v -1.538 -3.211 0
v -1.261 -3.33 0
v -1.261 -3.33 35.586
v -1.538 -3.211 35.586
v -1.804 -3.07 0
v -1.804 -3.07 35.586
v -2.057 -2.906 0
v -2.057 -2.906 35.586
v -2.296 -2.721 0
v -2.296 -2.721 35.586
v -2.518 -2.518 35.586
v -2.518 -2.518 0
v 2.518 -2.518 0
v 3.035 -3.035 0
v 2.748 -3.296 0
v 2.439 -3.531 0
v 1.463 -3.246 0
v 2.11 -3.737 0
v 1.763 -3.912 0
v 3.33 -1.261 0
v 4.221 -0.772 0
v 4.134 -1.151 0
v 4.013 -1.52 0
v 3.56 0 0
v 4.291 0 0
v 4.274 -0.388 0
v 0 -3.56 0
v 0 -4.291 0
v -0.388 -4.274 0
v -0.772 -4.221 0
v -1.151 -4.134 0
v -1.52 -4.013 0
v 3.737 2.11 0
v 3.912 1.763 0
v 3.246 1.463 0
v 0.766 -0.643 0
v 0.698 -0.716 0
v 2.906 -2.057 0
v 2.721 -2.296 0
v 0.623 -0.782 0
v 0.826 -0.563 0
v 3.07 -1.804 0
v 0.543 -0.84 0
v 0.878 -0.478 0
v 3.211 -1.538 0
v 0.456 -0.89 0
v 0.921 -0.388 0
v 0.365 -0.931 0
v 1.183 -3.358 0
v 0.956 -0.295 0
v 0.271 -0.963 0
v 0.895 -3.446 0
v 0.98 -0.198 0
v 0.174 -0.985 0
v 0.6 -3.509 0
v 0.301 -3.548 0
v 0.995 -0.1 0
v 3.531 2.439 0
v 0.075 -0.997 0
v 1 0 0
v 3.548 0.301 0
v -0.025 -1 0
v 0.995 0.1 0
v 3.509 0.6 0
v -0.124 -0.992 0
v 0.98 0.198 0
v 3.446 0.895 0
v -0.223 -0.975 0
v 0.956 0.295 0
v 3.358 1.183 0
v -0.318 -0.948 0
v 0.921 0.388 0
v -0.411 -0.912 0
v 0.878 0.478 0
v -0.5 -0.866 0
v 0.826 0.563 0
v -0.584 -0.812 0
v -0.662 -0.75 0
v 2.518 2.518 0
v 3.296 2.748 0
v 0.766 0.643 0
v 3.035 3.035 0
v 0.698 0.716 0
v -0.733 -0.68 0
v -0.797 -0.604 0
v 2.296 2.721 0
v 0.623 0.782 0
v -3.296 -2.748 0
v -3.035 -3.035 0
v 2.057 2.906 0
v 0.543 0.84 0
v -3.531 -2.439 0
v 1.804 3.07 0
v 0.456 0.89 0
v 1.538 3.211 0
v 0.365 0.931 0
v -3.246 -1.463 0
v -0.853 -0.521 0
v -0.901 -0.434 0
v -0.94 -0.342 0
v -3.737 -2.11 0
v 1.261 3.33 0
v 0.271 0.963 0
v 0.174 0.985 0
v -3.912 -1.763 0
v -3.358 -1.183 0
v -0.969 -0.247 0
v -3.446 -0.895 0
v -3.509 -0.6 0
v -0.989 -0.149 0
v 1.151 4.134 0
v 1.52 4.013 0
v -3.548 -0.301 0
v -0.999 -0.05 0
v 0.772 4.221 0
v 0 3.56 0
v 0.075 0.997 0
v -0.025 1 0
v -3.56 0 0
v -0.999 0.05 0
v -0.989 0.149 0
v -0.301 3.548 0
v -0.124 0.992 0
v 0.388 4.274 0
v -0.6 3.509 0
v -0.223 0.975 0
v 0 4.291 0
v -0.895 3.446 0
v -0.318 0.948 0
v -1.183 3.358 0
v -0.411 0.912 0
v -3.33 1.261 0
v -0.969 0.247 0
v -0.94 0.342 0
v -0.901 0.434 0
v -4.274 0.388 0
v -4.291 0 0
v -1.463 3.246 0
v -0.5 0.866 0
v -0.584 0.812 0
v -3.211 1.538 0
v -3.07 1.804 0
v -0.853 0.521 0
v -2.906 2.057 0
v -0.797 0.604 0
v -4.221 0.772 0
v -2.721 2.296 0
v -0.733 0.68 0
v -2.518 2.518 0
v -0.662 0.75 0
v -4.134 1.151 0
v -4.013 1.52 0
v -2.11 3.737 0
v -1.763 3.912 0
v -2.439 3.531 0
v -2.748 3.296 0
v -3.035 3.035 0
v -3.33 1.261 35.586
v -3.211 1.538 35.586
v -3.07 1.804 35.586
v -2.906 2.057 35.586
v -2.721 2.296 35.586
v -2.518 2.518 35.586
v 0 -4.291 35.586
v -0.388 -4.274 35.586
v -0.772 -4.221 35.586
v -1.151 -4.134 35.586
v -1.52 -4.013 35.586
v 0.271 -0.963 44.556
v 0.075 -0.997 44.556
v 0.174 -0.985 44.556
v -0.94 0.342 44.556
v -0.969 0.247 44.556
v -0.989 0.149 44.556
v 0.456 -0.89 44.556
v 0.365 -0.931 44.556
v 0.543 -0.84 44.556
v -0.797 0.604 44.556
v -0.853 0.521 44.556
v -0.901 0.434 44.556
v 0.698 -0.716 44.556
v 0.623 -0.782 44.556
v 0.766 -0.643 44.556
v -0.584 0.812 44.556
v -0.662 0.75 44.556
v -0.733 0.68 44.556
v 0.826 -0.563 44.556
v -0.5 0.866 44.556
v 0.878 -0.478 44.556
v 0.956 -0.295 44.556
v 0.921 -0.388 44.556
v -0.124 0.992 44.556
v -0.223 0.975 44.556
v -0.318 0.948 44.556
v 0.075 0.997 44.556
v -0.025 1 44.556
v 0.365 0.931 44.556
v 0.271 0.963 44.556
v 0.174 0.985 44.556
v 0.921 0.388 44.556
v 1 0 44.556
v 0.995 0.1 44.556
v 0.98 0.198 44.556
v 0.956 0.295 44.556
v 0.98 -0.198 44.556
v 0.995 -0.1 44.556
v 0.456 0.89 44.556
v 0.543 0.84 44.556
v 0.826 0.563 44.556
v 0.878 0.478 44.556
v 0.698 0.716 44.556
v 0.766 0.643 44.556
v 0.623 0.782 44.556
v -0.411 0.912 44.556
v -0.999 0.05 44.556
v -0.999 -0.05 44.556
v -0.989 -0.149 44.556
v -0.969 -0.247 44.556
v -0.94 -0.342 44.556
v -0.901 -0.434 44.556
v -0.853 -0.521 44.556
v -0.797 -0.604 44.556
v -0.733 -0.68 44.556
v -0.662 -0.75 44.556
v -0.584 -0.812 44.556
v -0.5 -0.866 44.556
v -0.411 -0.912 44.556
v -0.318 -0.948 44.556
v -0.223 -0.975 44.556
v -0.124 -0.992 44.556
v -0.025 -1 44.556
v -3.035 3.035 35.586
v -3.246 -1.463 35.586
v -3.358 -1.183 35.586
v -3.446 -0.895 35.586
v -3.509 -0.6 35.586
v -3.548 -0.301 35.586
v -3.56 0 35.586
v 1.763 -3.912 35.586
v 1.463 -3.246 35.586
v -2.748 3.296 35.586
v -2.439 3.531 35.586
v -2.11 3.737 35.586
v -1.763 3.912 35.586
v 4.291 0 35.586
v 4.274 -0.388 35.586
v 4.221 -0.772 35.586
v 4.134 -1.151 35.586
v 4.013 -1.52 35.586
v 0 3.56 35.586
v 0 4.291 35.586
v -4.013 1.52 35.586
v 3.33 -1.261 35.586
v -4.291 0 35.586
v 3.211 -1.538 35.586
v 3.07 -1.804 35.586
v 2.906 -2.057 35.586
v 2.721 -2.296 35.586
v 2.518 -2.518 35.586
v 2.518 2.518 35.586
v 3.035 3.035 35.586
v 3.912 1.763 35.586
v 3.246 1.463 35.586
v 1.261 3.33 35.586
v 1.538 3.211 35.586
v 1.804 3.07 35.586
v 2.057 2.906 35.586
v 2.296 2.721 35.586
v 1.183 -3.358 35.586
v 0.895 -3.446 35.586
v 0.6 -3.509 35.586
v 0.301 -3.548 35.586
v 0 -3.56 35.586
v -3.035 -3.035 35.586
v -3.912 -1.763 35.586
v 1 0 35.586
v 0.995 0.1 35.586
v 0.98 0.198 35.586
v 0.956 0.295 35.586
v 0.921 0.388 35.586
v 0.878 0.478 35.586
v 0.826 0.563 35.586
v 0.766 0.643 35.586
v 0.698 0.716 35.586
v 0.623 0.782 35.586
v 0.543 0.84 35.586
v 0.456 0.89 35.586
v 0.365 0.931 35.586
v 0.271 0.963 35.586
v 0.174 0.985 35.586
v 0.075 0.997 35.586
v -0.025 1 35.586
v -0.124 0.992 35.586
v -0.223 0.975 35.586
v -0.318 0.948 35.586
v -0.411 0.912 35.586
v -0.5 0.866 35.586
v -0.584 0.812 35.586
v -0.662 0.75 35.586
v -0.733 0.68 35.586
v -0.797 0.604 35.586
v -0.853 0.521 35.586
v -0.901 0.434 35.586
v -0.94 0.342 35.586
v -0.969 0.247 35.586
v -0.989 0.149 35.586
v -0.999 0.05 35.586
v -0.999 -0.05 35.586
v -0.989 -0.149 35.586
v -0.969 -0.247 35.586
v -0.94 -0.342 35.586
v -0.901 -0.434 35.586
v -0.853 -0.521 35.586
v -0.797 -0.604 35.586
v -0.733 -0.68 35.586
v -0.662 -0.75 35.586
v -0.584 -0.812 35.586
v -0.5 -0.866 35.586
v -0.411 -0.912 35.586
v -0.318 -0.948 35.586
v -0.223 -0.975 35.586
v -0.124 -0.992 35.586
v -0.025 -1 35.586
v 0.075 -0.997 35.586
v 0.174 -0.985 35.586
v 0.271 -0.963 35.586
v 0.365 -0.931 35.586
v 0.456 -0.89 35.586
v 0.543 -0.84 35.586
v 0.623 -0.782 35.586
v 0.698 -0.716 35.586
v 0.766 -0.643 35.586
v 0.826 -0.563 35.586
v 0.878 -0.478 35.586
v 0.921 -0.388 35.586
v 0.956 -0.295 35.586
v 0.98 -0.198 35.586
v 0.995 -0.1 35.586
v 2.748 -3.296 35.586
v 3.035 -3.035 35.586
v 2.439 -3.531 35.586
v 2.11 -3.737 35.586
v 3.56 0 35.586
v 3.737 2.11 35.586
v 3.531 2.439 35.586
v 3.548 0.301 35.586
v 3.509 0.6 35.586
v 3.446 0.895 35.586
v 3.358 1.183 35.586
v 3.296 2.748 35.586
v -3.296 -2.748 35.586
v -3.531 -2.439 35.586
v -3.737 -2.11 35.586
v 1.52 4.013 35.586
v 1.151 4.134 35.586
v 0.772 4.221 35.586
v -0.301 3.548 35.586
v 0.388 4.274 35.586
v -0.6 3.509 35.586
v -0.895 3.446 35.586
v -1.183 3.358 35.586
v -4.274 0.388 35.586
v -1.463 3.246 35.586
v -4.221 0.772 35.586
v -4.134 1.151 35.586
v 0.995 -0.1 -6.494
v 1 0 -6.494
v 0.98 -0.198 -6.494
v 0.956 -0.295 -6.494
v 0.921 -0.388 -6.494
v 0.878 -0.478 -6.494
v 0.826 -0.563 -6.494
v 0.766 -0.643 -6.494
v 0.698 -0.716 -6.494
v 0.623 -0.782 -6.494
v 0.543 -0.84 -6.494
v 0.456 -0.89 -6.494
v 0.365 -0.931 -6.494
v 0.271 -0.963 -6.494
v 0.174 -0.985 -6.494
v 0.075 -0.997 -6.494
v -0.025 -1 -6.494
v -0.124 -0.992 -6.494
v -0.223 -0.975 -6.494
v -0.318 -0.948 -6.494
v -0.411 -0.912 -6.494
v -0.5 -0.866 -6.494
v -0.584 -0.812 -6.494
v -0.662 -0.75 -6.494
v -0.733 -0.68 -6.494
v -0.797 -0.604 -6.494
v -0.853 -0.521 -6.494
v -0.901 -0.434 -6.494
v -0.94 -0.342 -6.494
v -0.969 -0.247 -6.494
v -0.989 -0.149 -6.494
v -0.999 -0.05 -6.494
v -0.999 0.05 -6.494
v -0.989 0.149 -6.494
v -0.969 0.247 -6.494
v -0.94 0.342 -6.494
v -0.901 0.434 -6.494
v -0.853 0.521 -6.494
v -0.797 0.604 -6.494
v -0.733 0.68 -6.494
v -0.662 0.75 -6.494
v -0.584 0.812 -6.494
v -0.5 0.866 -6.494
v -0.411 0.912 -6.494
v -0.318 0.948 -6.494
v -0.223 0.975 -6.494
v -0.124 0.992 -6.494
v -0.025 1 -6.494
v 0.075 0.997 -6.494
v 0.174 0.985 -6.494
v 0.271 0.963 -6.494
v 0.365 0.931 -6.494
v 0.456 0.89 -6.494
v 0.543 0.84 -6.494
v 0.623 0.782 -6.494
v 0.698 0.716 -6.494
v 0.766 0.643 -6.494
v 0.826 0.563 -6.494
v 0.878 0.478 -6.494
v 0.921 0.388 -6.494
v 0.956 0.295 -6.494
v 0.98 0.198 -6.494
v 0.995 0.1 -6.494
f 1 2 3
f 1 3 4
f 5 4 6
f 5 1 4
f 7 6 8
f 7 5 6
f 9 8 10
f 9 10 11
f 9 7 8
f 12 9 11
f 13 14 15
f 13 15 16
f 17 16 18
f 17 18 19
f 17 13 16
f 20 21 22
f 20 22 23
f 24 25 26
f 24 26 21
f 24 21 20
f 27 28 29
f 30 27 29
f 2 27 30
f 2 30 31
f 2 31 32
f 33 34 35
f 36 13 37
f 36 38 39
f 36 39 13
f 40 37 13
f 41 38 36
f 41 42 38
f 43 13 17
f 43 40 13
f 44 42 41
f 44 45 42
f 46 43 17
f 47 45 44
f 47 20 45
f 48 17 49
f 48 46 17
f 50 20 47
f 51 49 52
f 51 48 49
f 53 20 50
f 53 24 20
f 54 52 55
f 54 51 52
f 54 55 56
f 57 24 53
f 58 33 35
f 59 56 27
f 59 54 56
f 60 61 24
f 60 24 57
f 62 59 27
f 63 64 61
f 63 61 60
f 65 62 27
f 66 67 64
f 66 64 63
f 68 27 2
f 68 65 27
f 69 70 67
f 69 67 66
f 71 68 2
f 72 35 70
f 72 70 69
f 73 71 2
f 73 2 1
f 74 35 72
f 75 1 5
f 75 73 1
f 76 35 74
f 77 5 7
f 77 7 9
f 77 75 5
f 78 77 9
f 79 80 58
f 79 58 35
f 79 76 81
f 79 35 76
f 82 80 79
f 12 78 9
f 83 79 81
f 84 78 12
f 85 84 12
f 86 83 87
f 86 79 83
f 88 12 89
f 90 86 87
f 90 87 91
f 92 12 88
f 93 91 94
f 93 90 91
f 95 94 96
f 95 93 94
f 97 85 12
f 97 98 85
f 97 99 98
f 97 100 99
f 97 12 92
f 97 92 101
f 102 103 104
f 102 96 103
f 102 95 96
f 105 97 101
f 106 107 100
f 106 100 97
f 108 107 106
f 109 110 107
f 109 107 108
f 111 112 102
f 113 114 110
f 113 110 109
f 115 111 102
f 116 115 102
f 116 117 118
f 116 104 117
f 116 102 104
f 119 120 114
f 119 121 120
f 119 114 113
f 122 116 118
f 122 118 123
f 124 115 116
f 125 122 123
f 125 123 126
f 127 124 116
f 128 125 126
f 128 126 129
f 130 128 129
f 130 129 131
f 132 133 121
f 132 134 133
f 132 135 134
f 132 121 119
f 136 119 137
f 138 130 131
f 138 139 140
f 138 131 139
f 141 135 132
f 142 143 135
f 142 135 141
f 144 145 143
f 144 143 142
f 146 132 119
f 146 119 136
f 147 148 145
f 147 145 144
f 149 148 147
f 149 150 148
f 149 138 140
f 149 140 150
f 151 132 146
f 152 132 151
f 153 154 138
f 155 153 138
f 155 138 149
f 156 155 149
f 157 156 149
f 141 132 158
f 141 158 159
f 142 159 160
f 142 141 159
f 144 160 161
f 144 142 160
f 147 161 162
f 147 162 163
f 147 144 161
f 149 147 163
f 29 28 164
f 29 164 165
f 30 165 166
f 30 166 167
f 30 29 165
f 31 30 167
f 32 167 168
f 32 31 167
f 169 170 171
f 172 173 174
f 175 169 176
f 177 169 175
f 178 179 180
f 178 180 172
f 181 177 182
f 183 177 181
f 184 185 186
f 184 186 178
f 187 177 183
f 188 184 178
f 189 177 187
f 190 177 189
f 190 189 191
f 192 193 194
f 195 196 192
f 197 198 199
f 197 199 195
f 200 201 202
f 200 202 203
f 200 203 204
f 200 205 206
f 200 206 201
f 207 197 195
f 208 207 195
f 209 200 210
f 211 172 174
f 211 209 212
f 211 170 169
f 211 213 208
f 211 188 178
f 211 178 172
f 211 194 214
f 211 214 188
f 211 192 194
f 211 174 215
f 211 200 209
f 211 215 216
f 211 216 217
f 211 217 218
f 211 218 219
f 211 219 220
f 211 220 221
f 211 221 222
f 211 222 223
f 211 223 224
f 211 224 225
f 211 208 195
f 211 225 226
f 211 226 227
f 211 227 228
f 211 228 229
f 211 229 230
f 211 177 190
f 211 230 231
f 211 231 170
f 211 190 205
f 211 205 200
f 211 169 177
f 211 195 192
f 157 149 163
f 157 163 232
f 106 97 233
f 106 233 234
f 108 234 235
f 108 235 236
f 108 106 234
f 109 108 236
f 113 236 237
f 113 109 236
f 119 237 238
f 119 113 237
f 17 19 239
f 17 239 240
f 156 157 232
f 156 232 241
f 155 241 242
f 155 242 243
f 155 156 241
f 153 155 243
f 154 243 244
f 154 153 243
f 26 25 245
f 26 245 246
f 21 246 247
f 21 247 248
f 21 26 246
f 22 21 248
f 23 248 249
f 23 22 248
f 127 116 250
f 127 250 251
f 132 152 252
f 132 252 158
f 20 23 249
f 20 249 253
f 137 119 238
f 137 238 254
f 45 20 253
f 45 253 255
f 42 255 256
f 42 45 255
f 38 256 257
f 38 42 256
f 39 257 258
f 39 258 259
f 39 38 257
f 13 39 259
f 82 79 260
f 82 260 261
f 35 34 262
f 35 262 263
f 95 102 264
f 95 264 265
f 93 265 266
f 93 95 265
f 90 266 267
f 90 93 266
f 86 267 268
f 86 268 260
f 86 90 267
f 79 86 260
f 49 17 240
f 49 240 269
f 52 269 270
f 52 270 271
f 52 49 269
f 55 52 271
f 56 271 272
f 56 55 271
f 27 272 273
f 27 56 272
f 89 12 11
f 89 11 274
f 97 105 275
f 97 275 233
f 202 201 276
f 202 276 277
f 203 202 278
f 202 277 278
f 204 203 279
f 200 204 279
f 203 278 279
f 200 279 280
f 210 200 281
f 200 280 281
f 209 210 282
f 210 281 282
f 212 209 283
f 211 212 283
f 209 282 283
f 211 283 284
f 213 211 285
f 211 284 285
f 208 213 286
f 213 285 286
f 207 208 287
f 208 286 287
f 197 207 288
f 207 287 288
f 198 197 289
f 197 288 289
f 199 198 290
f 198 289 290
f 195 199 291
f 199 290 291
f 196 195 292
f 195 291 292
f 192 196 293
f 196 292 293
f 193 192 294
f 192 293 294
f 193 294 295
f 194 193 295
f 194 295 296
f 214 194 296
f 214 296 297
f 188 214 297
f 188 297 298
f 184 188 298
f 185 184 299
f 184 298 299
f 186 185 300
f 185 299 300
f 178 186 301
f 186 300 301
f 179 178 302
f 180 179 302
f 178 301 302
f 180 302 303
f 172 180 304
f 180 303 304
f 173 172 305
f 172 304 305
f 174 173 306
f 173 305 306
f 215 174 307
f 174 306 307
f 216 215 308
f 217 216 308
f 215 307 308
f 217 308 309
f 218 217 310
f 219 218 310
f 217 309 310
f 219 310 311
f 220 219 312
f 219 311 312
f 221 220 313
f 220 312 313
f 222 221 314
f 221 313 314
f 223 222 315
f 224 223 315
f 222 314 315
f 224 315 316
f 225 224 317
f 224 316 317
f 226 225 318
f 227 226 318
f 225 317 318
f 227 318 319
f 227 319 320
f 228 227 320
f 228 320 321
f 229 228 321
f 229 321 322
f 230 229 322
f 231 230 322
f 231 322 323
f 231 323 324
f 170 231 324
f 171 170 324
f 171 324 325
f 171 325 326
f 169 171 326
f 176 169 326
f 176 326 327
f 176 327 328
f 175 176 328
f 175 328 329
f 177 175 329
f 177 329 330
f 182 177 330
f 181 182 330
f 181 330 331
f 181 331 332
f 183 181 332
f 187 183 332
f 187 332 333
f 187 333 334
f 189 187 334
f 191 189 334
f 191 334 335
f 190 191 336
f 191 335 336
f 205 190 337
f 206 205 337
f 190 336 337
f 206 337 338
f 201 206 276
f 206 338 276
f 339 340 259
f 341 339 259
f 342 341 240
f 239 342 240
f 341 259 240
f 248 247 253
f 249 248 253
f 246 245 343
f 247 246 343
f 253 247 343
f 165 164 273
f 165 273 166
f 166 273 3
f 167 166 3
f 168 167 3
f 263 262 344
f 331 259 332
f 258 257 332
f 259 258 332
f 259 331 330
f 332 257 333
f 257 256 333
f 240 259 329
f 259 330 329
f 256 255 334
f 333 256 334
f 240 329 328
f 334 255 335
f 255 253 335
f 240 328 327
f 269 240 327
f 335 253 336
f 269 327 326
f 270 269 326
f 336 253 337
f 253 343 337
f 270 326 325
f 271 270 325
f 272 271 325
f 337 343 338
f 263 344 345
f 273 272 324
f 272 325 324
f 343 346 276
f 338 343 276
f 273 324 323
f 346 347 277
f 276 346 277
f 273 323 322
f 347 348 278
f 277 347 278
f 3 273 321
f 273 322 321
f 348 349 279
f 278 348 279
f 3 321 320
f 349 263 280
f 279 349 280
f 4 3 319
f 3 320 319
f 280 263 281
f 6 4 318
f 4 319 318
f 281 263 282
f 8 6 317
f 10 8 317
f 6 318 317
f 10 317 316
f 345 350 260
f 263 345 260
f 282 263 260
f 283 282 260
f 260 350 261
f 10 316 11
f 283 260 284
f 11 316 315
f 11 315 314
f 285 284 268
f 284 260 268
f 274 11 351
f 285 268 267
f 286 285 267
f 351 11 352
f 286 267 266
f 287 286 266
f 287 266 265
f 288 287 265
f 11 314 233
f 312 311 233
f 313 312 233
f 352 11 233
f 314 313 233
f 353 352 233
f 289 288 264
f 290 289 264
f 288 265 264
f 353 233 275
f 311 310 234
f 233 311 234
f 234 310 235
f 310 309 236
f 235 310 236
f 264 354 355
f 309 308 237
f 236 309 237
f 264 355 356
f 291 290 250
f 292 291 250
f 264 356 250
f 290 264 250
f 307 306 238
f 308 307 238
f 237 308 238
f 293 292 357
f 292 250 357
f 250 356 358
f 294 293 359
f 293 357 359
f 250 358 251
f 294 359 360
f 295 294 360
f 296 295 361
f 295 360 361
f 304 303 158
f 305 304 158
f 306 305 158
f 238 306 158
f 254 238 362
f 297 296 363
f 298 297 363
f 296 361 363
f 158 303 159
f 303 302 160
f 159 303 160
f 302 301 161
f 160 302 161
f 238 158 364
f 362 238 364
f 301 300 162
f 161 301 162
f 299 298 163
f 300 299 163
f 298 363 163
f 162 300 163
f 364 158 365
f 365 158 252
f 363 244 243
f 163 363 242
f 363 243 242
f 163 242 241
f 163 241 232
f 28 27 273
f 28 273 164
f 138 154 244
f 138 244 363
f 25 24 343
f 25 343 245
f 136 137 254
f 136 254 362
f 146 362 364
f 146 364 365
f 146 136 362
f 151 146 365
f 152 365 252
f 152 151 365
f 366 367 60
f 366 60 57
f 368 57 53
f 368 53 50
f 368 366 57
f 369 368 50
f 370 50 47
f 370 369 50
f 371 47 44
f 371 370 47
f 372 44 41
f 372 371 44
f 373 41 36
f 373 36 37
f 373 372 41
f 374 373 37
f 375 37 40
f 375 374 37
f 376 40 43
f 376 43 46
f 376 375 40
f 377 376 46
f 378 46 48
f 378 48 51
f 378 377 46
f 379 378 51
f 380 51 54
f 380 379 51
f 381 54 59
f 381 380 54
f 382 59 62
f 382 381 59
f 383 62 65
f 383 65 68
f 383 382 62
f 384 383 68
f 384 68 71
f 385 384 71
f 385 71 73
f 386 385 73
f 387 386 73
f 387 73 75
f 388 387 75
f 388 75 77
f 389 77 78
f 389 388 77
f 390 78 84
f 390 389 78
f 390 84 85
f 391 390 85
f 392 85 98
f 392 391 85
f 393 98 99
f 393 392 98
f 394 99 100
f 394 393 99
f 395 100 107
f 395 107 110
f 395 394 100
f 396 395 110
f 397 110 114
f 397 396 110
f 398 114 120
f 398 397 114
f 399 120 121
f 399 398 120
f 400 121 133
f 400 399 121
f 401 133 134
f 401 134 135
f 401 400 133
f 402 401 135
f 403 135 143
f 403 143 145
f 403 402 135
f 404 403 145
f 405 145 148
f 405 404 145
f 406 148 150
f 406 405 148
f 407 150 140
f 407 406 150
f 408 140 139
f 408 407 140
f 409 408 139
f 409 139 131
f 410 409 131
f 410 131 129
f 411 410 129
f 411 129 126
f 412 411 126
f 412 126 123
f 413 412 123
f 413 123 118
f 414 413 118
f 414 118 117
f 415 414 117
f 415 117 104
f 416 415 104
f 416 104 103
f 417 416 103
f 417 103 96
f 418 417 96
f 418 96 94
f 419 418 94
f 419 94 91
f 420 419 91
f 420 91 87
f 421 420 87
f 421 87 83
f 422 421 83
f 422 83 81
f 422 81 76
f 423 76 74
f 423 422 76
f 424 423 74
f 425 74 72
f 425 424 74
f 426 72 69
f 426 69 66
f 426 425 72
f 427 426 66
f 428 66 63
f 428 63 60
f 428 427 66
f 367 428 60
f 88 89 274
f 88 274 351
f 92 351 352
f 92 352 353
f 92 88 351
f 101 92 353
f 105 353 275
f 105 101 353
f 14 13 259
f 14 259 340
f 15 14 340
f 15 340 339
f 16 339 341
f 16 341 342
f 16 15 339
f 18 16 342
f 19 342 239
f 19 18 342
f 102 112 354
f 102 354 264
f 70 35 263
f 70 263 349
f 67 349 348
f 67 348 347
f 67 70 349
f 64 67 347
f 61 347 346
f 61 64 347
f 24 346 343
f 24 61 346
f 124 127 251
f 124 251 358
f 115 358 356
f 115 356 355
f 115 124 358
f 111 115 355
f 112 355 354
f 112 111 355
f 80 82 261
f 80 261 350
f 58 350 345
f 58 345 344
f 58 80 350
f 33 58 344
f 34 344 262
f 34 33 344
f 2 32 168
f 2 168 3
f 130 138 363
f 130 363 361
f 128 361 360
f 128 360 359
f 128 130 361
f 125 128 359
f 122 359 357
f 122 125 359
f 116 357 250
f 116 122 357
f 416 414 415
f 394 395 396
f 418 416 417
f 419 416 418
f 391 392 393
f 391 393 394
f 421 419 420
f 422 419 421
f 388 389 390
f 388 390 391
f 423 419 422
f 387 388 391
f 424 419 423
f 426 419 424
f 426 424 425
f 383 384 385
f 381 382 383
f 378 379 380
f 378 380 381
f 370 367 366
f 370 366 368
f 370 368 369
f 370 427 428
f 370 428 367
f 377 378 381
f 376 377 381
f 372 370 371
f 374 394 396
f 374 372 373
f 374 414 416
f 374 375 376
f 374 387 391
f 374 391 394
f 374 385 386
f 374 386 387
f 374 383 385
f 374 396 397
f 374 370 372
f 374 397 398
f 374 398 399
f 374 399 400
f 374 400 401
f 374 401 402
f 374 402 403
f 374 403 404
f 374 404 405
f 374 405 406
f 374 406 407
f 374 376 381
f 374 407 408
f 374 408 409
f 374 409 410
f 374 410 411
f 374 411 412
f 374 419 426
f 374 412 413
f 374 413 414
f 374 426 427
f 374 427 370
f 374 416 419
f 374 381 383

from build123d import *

# Parameters (mm, degrees)
BOSS_EXTRUDE1_DEPTH = 35.585942761
SKETCH2_R           = 1
BOSS_EXTRUDE2_DEPTH = 8.970038879
BOSS_EXTRUDE3_START = 6.494237864
SKETCH3_R           = 1
BOSS_EXTRUDE3_DEPTH = 6.494237864


with BuildPart() as part:
    # Sketch1 → Boss-Extrude1 (new body)
    with BuildSketch(Plane.XY):
        with BuildLine():
            Line((0, 3.560392335), (0, 4.291474396))
            ThreePointArc((0, 4.291474396), (0.77248629, 4.221376248), (1.519736563, 4.013371808))
            Line((1.519736563, 4.013371808), (1.260839029, 3.329666428))
            ThreePointArc((1.260839029, 3.329666428), (1.932350917, 2.990386849), (2.517577564, 2.517577564))
            Line((2.517577564, 2.517577564), (3.034530647, 3.034530647))
            ThreePointArc((3.034530647, 3.034530647), (3.531194065, 2.438733477), (3.912498451, 1.763266392))
            Line((3.912498451, 1.763266392), (3.245977537, 1.462881883))
            ThreePointArc((3.245977537, 1.462881883), (3.480901257, 0.748144382), (3.560392335, 0))
            Line((3.560392335, 0), (4.291474396, 0))
            ThreePointArc((4.291474396, 0), (4.221376248, -0.77248629), (4.013371808, -1.519736563))
            Line((4.013371808, -1.519736563), (3.329666428, -1.260839029))
            ThreePointArc((3.329666428, -1.260839029), (2.990386849, -1.932350917), (2.517577564, -2.517577564))
            Line((2.517577564, -2.517577564), (3.034530647, -3.034530647))
            ThreePointArc((3.034530647, -3.034530647), (2.438733477, -3.531194065), (1.763266392, -3.912498451))
            Line((1.763266392, -3.912498451), (1.462881883, -3.245977537))
            ThreePointArc((1.462881883, -3.245977537), (0.748144382, -3.480901257), (0, -3.560392335))
            Line((0, -3.560392335), (0, -4.291474396))
            ThreePointArc((0, -4.291474396), (-0.77248629, -4.221376248), (-1.519736563, -4.013371808))
            Line((-1.519736563, -4.013371808), (-1.260839029, -3.329666428))
            ThreePointArc((-1.260839029, -3.329666428), (-1.932350917, -2.990386849), (-2.517577564, -2.517577564))
            Line((-2.517577564, -2.517577564), (-3.034530647, -3.034530647))
            ThreePointArc((-3.034530647, -3.034530647), (-3.531194065, -2.438733477), (-3.912498451, -1.763266392))
            Line((-3.912498451, -1.763266392), (-3.245977537, -1.462881883))
            ThreePointArc((-3.245977537, -1.462881883), (-3.480901257, -0.748144382), (-3.560392335, 0))
            Line((-3.560392335, 0), (-4.291474396, 0))
            ThreePointArc((-4.291474396, 0), (-4.221376248, 0.77248629), (-4.013371808, 1.519736563))
            Line((-4.013371808, 1.519736563), (-3.329666428, 1.260839029))
            ThreePointArc((-3.329666428, 1.260839029), (-2.990386849, 1.932350917), (-2.517577564, 2.517577564))
            Line((-2.517577564, 2.517577564), (-3.034530647, 3.034530647))
            ThreePointArc((-3.034530647, 3.034530647), (-2.438733477, 3.531194065), (-1.763266392, 3.912498451))
            Line((-1.763266392, 3.912498451), (-1.462881883, 3.245977537))
            ThreePointArc((-1.462881883, 3.245977537), (-0.748144382, 3.480901257), (0, 3.560392335))
        make_face()
    extrude(amount=BOSS_EXTRUDE1_DEPTH)

    # Sketch2 → Boss-Extrude2 (add)
    with BuildSketch(Plane.XY.offset(35.585942761)):
        Circle(SKETCH2_R)
    extrude(amount=BOSS_EXTRUDE2_DEPTH)

    # Sketch3 → Boss-Extrude3 (add)
    with BuildSketch(Plane(origin=(0, 0, 0), x_dir=(-1, 0, 0), z_dir=(0, 0, -1)).offset(BOSS_EXTRUDE3_START)):
        Circle(SKETCH3_R)
    extrude(amount=-BOSS_EXTRUDE3_DEPTH)


solid = part.part
